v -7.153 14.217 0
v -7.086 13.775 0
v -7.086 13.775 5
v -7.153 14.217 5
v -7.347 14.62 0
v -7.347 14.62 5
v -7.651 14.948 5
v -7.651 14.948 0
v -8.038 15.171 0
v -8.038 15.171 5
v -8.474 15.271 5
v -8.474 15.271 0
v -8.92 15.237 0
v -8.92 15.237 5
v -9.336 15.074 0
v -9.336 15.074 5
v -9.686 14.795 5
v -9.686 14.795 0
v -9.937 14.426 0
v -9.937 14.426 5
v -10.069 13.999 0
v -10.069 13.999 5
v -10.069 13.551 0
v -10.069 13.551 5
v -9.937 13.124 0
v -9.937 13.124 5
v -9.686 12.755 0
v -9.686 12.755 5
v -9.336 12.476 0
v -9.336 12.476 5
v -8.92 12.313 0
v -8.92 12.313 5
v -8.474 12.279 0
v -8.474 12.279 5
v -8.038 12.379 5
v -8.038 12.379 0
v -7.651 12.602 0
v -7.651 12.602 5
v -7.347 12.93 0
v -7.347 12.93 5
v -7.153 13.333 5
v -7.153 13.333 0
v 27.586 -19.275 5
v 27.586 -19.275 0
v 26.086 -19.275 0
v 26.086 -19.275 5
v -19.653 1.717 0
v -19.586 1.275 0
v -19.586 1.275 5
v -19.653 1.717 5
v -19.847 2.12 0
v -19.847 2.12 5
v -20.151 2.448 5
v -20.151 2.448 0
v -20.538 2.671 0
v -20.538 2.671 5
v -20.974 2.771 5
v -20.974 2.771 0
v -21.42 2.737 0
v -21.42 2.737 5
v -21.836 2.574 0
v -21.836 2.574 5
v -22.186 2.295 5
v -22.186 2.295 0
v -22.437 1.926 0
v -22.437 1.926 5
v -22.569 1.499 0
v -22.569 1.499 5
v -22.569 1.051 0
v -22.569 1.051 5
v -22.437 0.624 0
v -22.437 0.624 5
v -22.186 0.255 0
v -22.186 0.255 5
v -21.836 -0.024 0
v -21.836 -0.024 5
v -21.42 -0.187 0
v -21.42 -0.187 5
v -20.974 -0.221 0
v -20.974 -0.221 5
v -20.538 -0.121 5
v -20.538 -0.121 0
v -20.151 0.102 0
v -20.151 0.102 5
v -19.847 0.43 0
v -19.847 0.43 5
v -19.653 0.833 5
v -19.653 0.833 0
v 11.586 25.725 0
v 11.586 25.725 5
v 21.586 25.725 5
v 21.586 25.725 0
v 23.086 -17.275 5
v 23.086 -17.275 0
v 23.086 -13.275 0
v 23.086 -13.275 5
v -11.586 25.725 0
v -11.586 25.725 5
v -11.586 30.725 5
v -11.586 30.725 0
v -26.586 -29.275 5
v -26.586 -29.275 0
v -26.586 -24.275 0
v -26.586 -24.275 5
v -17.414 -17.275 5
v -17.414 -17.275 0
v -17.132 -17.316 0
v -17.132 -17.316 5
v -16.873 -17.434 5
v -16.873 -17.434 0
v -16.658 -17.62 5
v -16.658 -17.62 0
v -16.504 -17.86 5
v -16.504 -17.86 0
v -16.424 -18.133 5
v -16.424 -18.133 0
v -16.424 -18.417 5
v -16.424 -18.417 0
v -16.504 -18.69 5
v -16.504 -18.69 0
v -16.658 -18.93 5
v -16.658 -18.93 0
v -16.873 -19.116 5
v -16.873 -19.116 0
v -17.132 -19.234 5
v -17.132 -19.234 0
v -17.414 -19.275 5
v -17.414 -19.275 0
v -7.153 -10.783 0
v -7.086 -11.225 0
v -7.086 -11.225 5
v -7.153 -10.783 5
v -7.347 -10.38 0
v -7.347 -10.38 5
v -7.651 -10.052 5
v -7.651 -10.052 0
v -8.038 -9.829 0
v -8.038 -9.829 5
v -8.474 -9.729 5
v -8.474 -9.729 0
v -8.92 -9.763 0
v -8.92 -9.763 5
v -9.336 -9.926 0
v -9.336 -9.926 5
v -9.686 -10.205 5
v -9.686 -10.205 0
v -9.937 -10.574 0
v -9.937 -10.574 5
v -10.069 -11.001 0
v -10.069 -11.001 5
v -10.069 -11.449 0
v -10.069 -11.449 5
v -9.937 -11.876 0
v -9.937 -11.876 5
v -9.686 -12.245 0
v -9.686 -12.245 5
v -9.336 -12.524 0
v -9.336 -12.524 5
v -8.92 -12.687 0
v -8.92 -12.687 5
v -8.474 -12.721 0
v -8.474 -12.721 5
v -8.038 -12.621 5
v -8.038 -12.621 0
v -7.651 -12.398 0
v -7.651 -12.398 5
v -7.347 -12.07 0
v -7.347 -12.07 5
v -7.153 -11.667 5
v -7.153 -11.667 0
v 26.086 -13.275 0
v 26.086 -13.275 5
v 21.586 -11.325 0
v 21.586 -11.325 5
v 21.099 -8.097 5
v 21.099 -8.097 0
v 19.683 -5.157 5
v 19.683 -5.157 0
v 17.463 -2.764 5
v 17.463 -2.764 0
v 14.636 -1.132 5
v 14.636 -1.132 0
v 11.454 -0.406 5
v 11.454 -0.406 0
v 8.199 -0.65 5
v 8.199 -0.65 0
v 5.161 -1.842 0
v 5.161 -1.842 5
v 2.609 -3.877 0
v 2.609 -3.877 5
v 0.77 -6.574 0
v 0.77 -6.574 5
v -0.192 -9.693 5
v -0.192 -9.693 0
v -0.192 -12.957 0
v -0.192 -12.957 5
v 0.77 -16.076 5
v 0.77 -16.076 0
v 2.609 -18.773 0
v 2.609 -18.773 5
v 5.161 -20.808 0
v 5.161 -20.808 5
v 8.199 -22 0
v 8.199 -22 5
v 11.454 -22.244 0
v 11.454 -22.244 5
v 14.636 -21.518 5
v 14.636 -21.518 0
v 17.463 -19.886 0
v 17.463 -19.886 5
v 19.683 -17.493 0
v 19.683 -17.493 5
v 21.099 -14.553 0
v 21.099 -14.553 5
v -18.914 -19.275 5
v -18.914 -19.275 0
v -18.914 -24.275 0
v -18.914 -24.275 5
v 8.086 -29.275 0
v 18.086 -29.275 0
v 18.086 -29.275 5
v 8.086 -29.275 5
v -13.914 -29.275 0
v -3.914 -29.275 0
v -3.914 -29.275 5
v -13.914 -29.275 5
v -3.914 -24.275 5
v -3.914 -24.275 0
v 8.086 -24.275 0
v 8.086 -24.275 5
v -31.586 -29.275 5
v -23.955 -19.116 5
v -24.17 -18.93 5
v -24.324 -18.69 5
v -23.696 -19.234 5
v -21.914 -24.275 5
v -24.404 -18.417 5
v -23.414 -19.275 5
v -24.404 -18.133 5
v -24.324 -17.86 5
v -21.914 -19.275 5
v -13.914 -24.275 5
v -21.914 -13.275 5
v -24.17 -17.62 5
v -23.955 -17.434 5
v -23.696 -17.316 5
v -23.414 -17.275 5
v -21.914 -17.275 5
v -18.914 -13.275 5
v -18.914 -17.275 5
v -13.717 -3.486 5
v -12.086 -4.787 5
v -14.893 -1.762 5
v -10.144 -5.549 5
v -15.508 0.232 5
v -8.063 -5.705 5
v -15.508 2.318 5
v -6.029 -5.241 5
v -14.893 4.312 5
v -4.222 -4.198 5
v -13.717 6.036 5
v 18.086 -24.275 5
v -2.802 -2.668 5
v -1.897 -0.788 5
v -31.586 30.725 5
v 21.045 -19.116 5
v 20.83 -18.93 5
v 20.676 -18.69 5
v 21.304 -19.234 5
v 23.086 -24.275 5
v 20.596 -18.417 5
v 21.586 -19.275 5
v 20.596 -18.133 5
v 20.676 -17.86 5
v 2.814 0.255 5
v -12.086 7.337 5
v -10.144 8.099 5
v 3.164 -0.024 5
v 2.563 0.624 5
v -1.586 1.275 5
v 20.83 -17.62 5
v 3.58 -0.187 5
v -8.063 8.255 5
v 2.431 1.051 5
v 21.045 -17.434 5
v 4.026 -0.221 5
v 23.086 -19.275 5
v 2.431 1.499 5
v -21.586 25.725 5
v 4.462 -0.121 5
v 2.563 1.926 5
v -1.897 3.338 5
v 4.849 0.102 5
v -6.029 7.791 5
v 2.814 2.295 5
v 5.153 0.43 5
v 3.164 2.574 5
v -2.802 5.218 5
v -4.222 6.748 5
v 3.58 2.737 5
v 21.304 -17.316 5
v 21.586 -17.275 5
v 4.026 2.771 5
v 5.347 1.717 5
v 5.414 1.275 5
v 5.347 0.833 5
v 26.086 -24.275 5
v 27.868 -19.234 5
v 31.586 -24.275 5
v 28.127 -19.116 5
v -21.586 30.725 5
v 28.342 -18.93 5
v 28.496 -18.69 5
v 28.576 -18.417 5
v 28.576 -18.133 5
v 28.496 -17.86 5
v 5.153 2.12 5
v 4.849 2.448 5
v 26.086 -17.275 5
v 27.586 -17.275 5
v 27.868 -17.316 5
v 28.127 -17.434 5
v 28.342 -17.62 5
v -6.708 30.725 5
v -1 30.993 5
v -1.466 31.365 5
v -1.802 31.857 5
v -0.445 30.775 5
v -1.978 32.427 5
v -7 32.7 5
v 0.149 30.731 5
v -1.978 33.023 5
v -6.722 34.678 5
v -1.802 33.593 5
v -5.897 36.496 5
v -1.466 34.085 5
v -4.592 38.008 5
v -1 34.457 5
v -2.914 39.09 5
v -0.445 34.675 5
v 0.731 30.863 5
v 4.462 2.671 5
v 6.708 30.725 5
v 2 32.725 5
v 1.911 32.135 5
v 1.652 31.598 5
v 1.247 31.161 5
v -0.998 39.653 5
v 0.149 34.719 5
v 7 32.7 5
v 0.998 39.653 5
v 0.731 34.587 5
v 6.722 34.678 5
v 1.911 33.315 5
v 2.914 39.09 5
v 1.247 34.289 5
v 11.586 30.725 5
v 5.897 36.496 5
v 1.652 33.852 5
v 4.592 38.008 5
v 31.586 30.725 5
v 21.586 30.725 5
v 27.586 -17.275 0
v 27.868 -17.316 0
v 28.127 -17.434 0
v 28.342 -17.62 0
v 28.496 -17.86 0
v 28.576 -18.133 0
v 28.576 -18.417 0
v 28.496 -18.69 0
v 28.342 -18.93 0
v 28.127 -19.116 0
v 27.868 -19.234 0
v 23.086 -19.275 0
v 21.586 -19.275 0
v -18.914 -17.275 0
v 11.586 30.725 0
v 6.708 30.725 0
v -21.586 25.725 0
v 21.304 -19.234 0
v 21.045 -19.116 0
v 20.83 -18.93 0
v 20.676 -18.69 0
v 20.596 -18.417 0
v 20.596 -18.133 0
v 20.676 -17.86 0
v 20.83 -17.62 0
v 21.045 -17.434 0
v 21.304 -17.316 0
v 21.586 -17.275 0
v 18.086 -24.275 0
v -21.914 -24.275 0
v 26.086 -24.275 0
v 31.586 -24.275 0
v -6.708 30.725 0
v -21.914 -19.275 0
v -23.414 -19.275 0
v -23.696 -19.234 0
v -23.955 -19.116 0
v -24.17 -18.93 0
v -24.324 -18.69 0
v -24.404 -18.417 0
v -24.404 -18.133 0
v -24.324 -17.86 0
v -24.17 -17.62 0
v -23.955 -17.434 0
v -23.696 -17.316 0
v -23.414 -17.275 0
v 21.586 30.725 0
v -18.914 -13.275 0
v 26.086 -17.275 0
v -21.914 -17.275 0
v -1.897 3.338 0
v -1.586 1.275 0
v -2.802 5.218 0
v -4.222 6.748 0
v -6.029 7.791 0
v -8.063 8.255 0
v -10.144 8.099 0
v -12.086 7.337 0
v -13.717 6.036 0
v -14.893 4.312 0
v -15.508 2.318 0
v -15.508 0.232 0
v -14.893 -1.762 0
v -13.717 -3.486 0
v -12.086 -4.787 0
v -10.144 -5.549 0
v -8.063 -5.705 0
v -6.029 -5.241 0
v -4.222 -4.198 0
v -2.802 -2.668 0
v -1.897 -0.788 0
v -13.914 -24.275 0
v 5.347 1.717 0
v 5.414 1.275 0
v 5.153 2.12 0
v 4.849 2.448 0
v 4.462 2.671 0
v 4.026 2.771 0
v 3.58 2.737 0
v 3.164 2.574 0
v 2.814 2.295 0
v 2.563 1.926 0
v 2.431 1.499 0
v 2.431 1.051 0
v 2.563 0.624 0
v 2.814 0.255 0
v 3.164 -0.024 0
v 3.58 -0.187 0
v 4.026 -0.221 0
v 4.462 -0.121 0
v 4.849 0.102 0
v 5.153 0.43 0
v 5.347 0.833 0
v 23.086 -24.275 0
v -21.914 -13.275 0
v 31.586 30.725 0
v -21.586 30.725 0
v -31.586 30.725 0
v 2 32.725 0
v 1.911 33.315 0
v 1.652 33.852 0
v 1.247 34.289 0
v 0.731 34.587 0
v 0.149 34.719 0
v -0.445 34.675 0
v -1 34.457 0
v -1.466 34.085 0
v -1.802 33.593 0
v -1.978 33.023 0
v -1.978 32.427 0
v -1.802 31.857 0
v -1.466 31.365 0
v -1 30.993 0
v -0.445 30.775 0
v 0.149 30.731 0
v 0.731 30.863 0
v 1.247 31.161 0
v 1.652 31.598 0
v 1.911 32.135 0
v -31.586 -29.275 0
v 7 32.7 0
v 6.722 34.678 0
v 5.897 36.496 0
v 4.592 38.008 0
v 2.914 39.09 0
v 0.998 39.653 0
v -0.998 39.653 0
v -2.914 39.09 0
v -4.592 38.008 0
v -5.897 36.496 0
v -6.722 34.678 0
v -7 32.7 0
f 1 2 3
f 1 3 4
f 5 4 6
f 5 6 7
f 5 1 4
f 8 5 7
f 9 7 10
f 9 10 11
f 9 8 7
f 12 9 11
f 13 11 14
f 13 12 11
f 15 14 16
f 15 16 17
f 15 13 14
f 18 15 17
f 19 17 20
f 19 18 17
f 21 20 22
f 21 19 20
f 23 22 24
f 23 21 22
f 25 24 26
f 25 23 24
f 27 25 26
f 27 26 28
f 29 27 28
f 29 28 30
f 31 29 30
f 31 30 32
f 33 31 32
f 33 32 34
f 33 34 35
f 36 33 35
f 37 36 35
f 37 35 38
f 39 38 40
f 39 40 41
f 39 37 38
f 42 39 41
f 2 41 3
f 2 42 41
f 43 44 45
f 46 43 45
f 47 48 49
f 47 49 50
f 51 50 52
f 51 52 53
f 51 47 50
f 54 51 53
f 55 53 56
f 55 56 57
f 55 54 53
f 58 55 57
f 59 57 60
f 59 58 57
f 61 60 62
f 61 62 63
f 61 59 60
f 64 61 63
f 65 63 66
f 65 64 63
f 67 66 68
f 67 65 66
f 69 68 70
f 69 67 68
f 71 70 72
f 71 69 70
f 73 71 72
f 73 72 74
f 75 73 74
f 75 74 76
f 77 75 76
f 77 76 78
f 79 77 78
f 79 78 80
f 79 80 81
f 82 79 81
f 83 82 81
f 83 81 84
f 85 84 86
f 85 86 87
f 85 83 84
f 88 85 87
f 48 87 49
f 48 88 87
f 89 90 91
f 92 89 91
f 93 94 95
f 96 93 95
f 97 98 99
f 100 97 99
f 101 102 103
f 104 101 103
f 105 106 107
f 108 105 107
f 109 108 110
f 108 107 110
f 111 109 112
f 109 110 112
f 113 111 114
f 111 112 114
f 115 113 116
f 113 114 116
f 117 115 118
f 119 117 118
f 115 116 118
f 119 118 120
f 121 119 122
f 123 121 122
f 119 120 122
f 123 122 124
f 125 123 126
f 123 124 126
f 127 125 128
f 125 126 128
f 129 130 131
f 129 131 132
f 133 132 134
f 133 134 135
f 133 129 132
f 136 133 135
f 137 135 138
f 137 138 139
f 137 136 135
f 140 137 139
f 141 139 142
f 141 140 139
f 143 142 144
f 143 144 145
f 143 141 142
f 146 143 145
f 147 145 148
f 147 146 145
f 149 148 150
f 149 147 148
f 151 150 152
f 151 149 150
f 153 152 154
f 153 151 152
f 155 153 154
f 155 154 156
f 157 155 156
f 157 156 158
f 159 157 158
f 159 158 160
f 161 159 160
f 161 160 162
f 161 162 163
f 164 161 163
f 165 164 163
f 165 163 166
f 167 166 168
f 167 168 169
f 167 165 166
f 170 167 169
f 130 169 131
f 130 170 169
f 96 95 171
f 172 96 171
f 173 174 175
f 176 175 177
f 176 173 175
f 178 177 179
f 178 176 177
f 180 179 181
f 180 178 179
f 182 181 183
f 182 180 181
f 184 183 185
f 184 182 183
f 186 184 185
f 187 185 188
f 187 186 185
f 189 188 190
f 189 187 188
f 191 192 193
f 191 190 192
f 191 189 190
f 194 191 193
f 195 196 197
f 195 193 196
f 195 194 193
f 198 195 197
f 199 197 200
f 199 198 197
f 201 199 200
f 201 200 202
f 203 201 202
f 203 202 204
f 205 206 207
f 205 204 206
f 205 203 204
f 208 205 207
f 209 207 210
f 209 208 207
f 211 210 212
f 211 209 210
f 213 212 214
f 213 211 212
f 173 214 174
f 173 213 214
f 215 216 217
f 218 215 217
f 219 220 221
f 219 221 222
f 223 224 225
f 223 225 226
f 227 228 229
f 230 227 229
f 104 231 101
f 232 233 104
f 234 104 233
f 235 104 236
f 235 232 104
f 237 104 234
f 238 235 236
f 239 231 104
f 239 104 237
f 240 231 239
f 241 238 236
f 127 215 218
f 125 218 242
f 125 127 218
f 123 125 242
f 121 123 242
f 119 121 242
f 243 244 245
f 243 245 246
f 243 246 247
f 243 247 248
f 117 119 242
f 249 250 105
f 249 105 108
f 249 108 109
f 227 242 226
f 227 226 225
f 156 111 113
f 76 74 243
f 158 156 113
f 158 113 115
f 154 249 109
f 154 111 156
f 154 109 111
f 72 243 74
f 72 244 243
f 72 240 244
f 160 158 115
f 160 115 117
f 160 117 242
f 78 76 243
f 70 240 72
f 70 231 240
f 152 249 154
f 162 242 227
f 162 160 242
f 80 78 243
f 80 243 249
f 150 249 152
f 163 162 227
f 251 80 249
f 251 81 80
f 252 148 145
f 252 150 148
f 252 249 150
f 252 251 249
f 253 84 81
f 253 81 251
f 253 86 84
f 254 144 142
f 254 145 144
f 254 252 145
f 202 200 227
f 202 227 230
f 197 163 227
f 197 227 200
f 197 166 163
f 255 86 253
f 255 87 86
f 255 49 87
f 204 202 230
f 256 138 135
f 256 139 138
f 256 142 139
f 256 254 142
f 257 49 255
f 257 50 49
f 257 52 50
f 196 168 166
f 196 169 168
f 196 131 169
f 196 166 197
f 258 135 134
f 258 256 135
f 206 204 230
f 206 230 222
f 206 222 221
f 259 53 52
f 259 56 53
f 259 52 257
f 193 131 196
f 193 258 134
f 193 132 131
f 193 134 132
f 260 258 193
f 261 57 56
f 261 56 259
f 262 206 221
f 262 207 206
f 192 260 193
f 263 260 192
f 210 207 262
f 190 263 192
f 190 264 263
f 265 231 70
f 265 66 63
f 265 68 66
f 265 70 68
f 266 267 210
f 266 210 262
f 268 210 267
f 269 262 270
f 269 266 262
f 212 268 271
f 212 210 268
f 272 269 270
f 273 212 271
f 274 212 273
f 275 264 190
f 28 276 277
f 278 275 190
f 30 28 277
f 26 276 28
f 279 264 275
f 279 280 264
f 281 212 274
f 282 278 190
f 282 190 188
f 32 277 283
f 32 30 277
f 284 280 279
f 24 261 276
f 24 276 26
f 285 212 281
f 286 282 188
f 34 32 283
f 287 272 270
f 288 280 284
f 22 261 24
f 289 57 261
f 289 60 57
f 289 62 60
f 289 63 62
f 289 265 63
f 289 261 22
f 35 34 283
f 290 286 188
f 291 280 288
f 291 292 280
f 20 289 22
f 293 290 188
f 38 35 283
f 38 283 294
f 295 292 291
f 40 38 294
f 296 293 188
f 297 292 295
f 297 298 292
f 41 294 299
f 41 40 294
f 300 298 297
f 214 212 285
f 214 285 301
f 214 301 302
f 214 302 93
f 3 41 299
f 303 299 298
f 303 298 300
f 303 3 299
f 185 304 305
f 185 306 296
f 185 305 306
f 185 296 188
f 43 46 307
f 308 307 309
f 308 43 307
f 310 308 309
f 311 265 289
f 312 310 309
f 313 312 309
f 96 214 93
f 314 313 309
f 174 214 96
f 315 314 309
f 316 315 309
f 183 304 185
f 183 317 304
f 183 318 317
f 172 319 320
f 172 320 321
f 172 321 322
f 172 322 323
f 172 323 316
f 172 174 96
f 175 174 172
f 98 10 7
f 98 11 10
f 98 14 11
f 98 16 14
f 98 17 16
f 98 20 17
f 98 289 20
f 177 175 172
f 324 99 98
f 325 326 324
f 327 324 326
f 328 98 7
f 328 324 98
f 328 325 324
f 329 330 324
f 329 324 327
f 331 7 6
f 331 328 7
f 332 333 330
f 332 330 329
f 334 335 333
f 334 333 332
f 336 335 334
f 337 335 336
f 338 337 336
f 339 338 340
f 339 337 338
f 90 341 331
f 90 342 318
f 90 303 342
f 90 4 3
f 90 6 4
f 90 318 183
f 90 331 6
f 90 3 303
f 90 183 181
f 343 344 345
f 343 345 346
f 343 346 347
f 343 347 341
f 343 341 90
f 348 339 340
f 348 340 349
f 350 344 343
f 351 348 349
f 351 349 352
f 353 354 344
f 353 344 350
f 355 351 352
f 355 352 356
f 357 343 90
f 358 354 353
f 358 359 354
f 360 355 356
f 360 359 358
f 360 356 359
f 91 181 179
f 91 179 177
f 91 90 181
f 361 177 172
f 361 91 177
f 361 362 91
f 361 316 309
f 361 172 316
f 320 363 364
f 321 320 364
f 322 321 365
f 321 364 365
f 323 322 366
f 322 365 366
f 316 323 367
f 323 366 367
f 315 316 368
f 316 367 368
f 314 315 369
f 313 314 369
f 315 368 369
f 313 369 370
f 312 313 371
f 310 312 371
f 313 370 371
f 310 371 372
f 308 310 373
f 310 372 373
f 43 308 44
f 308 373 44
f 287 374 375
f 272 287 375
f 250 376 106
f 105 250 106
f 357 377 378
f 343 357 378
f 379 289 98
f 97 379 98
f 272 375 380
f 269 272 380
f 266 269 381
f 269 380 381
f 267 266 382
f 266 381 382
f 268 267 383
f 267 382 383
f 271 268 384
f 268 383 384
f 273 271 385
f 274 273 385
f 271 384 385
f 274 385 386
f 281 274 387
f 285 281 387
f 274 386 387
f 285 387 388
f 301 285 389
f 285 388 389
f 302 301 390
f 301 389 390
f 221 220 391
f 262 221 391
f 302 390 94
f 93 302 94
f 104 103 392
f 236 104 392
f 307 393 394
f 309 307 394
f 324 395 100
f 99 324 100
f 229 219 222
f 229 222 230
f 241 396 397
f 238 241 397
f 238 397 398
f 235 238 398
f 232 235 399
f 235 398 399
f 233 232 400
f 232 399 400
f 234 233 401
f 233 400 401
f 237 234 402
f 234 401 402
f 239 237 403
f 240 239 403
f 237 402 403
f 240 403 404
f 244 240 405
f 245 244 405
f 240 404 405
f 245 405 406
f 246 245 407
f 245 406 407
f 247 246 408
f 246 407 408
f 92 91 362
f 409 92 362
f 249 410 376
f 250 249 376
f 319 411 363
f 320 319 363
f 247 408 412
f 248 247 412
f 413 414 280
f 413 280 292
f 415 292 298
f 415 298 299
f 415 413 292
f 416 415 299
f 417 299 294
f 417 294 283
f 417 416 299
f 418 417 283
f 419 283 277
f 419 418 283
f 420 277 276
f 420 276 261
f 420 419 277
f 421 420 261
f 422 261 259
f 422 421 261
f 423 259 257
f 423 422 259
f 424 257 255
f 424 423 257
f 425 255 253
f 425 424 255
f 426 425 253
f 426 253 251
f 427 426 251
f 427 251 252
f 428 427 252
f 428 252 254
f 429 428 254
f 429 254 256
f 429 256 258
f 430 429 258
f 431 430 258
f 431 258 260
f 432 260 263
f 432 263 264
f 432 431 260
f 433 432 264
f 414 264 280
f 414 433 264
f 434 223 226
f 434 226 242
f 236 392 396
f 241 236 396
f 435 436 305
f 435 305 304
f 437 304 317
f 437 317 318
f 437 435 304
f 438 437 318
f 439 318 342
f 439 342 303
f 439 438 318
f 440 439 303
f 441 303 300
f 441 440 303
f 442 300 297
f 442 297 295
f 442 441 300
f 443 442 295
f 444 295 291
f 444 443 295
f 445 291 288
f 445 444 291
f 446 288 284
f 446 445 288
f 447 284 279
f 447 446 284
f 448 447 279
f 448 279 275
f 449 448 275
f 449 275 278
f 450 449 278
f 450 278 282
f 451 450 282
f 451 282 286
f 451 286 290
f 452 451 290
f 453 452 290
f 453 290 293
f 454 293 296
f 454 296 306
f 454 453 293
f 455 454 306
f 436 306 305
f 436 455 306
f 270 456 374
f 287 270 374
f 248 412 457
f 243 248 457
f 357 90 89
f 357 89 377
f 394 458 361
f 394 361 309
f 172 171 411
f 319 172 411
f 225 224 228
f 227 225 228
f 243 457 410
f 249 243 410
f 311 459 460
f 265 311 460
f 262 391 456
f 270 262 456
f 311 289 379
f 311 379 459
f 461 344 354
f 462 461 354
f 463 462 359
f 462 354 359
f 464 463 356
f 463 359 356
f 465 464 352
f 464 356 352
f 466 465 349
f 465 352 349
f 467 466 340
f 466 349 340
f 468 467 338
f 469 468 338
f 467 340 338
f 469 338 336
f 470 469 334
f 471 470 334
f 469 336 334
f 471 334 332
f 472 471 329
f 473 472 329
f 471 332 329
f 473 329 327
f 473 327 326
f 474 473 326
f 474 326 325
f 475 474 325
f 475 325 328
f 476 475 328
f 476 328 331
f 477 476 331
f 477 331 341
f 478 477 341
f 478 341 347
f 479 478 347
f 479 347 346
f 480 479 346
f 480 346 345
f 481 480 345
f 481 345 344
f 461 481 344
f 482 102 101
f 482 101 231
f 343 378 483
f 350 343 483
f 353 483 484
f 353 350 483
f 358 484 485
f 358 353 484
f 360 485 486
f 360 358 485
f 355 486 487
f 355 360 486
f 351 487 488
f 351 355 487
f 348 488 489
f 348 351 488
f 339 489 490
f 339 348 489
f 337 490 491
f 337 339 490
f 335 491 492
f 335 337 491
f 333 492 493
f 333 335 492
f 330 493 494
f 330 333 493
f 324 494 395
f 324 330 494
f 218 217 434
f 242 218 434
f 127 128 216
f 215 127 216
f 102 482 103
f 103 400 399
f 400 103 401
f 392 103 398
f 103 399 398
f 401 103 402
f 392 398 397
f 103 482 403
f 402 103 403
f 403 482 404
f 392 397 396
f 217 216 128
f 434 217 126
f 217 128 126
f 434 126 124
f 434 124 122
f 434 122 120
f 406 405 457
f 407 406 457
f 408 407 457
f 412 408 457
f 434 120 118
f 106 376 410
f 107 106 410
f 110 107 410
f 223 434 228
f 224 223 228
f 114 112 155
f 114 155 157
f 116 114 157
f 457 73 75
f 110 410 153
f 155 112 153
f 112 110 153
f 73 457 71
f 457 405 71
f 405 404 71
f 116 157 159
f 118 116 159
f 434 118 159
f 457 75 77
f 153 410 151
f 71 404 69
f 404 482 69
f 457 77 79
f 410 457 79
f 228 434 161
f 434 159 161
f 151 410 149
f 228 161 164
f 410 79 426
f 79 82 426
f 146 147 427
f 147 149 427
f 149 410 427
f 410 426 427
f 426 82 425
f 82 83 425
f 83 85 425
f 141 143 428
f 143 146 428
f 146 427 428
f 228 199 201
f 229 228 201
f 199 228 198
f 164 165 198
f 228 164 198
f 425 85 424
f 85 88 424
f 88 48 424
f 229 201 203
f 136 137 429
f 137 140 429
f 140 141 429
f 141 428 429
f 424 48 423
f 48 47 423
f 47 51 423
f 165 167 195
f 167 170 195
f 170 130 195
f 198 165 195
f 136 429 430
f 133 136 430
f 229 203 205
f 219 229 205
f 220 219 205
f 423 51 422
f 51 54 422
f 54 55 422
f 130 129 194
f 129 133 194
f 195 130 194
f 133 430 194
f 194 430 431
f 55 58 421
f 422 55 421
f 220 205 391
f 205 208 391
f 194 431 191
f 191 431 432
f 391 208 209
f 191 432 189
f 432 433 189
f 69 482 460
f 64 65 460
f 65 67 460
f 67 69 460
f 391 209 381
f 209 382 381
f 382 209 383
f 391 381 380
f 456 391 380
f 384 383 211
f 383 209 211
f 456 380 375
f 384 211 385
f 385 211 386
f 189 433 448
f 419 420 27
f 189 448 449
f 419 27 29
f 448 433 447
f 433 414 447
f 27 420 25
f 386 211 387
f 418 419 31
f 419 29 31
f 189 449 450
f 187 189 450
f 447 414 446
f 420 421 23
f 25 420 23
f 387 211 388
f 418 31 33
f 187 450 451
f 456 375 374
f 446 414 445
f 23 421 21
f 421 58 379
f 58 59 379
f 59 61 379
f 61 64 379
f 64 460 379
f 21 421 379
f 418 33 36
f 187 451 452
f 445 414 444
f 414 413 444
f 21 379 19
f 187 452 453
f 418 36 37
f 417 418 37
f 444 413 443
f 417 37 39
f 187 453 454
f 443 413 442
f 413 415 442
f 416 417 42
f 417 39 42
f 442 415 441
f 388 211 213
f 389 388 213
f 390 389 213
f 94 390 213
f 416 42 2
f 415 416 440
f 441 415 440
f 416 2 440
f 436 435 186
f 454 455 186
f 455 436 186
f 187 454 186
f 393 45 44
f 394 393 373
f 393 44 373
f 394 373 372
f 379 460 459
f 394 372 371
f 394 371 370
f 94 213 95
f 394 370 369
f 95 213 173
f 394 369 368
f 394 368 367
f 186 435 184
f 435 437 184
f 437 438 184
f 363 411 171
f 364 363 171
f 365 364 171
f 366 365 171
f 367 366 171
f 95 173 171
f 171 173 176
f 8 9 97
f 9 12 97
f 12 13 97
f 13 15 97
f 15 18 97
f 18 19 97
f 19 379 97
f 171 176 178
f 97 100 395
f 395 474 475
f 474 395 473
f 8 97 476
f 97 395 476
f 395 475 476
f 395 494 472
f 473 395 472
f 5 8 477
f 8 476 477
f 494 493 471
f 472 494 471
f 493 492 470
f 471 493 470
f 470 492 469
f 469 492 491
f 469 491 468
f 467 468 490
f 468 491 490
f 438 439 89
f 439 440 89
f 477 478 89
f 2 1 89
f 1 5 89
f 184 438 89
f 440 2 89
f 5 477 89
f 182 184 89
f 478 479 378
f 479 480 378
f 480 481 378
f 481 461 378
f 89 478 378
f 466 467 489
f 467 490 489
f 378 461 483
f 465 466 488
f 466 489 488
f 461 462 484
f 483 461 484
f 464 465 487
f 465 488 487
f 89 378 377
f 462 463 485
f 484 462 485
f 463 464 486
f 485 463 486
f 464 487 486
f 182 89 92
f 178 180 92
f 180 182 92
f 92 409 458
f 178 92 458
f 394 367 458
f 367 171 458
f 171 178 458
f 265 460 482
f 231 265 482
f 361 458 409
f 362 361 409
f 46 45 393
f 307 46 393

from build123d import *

# Parameters (mm, degrees)
SKETCH8_R           = 1.5
SKETCH8_R_2         = 7
SKETCH8_R_3         = 10.95
BOSS_EXTRUDE1_DEPTH = 5
SKETCH9_W           = 10
SKETCH9_H           = 5
SKETCH9_W_2         = 5
BOSS_EXTRUDE2_DEPTH = 5
SKETCH11_R          = 7
SKETCH11_R_2        = 2
SKETCH11_W          = 10
SKETCH11_H          = 5
BOSS_EXTRUDE4_DEPTH = 5
SKETCH11_2_W        = 10
SKETCH11_2_H        = 5
CUT_EXTRUDE1_DEPTH  = 5


with BuildPart() as part:
    # Sketch8 → Boss-Extrude1 (new body)
    with BuildSketch(Plane.XY):
        with BuildLine():
            Line((-31.585962214, 30.725), (-31.585962214, -24.275))
            Line((-31.585962214, -24.275), (-21.914037786, -24.275))
            Line((-21.914037786, -24.275), (-21.914037786, -19.275))
            Line((-21.914037786, -19.275), (-23.414037786, -19.275))
            ThreePointArc((-23.414037786, -19.275), (-24.414037786, -18.275), (-23.414037786, -17.275))
            Line((-23.414037786, -17.275), (-21.914037786, -17.275))
            Line((-21.914037786, -17.275), (-21.914037786, -13.275))
            Line((-21.914037786, -13.275), (-18.914037786, -13.275))
            Line((-18.914037786, -13.275), (-18.914037786, -17.275))
            Line((-18.914037786, -17.275), (-17.414037786, -17.275))
            ThreePointArc((-17.414037786, -17.275), (-16.414037786, -18.275), (-17.414037786, -19.275))
            Line((-17.414037786, -19.275), (-18.914037786, -19.275))
            Line((-18.914037786, -19.275), (-18.914037786, -24.275))
            Line((-18.914037786, -24.275), (21.585962214, -24.275))
            Line((21.585962214, -24.275), (23.085962214, -24.275))
            Line((23.085962214, -24.275), (23.085962214, -19.275))
            Line((23.085962214, -19.275), (21.585962214, -19.275))
            ThreePointArc((21.585962214, -19.275), (20.585962214, -18.275), (21.585962214, -17.275))
            Line((21.585962214, -17.275), (23.085962214, -17.275))
            Line((23.085962214, -17.275), (23.085962214, -13.275))
            Line((23.085962214, -13.275), (26.085962214, -13.275))
            Line((26.085962214, -13.275), (26.085962214, -17.275))
            Line((26.085962214, -17.275), (27.585962214, -17.275))
            ThreePointArc((27.585962214, -17.275), (28.585962214, -18.275), (27.585962214, -19.275))
            Line((27.585962214, -19.275), (26.085962214, -19.275))
            Line((26.085962214, -19.275), (26.085962214, -24.275))
            Line((26.085962214, -24.275), (31.585962214, -24.275))
            Line((31.585962214, -24.275), (31.585962214, -9.275))
            ThreePointArc((31.585962214, -9.275), (19.870233462, 19.009271247), (-8.414037786, 30.725))
            Line((-8.414037786, 30.725), (-18.914037786, 30.725))
            Line((-18.914037786, 30.725), (-18.914037786, 25.725))
            Line((-18.914037786, 25.725), (-17.414037786, 25.725))
            ThreePointArc((-17.414037786, 25.725), (-16.414037786, 24.725), (-17.414037786, 23.725))
            Line((-17.414037786, 23.725), (-18.914037786, 23.725))
            Line((-18.914037786, 23.725), (-18.914037786, 19.725))
            Line((-18.914037786, 19.725), (-21.914037786, 19.725))
            Line((-21.914037786, 19.725), (-21.914037786, 23.725))
            Line((-21.914037786, 23.725), (-23.414037786, 23.725))
            ThreePointArc((-23.414037786, 23.725), (-24.414037786, 24.725), (-23.414037786, 25.725))
            Line((-23.414037786, 25.725), (-21.914037786, 25.725))
            Line((-21.914037786, 25.725), (-21.914037786, 30.725))
            Line((-21.914037786, 30.725), (-31.585962214, 30.725))
        make_face()
        with Locations((-8.585962214, -11.225)):
            Circle(SKETCH8_R, mode=Mode.SUBTRACT)
        with Locations((-21.085962214, 1.275)):
            Circle(SKETCH8_R, mode=Mode.SUBTRACT)
        with Locations((-8.585962214, 1.275)):
            Circle(SKETCH8_R_2, mode=Mode.SUBTRACT)
        with Locations((10.635962214, -11.325)):
            Circle(SKETCH8_R_3, mode=Mode.SUBTRACT)
        with Locations((3.914037786, 1.275)):
            Circle(SKETCH8_R, mode=Mode.SUBTRACT)
        with Locations((-8.585962214, 13.775)):
            Circle(SKETCH8_R, mode=Mode.SUBTRACT)
    extrude(amount=BOSS_EXTRUDE1_DEPTH)

    # Sketch9 → Boss-Extrude2 (add)
    with BuildSketch(Plane(origin=(0, 0, 0), x_dir=(-1, 0, 0), z_dir=(0, 0, -1))):
        with Locations((-13.085962214, -26.775)):
            Rectangle(SKETCH9_W, SKETCH9_H)
        with Locations((8.914037786, -26.775)):
            Rectangle(SKETCH9_W, SKETCH9_H)
        with BuildLine():
            Line((31.585962214, 30.725), (-31.585962214, 30.725))
            Line((-31.585962214, 30.725), (-31.585962214, 11.746641407))
            Line((-31.585962214, 11.746641407), (-31.585962214, -2.994966805))
            Line((-31.585962214, -2.994966805), (-31.585962214, -9.275))
            Line((-31.585962214, -9.275), (-26.161018226, -9.275))
            Line((-26.161018226, -9.275), (-26.161018226, -2.994966805))
            Line((-26.161018226, -2.994966805), (-17.743215339, -2.994966805))
            Line((-17.743215339, -2.994966805), (-17.743215339, 11.746641407))
            Line((-17.743215339, 11.746641407), (6.40967317, 11.746641407))
            ThreePointArc((6.40967317, 11.746641407), (8.585962214, 16.749974384), (10.762251258, 11.746641407))
            Line((10.762251258, 11.746641407), (31.585962214, 11.746641407))
            Line((31.585962214, 11.746641407), (31.585962214, 30.725))
        make_face()
        with Locations((29.085962214, -26.775)):
            Rectangle(SKETCH9_W_2, SKETCH9_H)
    extrude(amount=-BOSS_EXTRUDE2_DEPTH)

    # Sketch11 → Boss-Extrude4 (add)
    # profile 1 of 3: a face of its own
    with BuildSketch(Plane.XY.offset(5)):
        with Locations((0, 32.725)):
            Circle(SKETCH11_R)
        with Locations((0, 32.725)):
            Circle(SKETCH11_R_2, mode=Mode.SUBTRACT)
    # profile 2 of 3: a face of its own
    with BuildSketch(Plane.XY.offset(5)):
        with Locations((-16.585962214, 28.225)):
            Rectangle(SKETCH11_W, SKETCH11_H)
    # profile 3 of 3: a face of its own
    with BuildSketch(Plane.XY.offset(5)):
        with Locations((16.585962214, 28.225)):
            Rectangle(SKETCH11_W, SKETCH11_H)
    extrude(amount=-BOSS_EXTRUDE4_DEPTH)

    # Sketch11<2> → Cut-Extrude1 (cut)
    with BuildSketch(Plane.XY.offset(5)):
        with Locations((-16.585962214, 28.225)):
            Rectangle(SKETCH11_2_W, SKETCH11_2_H)
        with Locations((16.585962214, 28.225)):
            Rectangle(SKETCH11_2_W, SKETCH11_2_H)
    extrude(amount=-CUT_EXTRUDE1_DEPTH, mode=Mode.SUBTRACT)


solid = part.part
